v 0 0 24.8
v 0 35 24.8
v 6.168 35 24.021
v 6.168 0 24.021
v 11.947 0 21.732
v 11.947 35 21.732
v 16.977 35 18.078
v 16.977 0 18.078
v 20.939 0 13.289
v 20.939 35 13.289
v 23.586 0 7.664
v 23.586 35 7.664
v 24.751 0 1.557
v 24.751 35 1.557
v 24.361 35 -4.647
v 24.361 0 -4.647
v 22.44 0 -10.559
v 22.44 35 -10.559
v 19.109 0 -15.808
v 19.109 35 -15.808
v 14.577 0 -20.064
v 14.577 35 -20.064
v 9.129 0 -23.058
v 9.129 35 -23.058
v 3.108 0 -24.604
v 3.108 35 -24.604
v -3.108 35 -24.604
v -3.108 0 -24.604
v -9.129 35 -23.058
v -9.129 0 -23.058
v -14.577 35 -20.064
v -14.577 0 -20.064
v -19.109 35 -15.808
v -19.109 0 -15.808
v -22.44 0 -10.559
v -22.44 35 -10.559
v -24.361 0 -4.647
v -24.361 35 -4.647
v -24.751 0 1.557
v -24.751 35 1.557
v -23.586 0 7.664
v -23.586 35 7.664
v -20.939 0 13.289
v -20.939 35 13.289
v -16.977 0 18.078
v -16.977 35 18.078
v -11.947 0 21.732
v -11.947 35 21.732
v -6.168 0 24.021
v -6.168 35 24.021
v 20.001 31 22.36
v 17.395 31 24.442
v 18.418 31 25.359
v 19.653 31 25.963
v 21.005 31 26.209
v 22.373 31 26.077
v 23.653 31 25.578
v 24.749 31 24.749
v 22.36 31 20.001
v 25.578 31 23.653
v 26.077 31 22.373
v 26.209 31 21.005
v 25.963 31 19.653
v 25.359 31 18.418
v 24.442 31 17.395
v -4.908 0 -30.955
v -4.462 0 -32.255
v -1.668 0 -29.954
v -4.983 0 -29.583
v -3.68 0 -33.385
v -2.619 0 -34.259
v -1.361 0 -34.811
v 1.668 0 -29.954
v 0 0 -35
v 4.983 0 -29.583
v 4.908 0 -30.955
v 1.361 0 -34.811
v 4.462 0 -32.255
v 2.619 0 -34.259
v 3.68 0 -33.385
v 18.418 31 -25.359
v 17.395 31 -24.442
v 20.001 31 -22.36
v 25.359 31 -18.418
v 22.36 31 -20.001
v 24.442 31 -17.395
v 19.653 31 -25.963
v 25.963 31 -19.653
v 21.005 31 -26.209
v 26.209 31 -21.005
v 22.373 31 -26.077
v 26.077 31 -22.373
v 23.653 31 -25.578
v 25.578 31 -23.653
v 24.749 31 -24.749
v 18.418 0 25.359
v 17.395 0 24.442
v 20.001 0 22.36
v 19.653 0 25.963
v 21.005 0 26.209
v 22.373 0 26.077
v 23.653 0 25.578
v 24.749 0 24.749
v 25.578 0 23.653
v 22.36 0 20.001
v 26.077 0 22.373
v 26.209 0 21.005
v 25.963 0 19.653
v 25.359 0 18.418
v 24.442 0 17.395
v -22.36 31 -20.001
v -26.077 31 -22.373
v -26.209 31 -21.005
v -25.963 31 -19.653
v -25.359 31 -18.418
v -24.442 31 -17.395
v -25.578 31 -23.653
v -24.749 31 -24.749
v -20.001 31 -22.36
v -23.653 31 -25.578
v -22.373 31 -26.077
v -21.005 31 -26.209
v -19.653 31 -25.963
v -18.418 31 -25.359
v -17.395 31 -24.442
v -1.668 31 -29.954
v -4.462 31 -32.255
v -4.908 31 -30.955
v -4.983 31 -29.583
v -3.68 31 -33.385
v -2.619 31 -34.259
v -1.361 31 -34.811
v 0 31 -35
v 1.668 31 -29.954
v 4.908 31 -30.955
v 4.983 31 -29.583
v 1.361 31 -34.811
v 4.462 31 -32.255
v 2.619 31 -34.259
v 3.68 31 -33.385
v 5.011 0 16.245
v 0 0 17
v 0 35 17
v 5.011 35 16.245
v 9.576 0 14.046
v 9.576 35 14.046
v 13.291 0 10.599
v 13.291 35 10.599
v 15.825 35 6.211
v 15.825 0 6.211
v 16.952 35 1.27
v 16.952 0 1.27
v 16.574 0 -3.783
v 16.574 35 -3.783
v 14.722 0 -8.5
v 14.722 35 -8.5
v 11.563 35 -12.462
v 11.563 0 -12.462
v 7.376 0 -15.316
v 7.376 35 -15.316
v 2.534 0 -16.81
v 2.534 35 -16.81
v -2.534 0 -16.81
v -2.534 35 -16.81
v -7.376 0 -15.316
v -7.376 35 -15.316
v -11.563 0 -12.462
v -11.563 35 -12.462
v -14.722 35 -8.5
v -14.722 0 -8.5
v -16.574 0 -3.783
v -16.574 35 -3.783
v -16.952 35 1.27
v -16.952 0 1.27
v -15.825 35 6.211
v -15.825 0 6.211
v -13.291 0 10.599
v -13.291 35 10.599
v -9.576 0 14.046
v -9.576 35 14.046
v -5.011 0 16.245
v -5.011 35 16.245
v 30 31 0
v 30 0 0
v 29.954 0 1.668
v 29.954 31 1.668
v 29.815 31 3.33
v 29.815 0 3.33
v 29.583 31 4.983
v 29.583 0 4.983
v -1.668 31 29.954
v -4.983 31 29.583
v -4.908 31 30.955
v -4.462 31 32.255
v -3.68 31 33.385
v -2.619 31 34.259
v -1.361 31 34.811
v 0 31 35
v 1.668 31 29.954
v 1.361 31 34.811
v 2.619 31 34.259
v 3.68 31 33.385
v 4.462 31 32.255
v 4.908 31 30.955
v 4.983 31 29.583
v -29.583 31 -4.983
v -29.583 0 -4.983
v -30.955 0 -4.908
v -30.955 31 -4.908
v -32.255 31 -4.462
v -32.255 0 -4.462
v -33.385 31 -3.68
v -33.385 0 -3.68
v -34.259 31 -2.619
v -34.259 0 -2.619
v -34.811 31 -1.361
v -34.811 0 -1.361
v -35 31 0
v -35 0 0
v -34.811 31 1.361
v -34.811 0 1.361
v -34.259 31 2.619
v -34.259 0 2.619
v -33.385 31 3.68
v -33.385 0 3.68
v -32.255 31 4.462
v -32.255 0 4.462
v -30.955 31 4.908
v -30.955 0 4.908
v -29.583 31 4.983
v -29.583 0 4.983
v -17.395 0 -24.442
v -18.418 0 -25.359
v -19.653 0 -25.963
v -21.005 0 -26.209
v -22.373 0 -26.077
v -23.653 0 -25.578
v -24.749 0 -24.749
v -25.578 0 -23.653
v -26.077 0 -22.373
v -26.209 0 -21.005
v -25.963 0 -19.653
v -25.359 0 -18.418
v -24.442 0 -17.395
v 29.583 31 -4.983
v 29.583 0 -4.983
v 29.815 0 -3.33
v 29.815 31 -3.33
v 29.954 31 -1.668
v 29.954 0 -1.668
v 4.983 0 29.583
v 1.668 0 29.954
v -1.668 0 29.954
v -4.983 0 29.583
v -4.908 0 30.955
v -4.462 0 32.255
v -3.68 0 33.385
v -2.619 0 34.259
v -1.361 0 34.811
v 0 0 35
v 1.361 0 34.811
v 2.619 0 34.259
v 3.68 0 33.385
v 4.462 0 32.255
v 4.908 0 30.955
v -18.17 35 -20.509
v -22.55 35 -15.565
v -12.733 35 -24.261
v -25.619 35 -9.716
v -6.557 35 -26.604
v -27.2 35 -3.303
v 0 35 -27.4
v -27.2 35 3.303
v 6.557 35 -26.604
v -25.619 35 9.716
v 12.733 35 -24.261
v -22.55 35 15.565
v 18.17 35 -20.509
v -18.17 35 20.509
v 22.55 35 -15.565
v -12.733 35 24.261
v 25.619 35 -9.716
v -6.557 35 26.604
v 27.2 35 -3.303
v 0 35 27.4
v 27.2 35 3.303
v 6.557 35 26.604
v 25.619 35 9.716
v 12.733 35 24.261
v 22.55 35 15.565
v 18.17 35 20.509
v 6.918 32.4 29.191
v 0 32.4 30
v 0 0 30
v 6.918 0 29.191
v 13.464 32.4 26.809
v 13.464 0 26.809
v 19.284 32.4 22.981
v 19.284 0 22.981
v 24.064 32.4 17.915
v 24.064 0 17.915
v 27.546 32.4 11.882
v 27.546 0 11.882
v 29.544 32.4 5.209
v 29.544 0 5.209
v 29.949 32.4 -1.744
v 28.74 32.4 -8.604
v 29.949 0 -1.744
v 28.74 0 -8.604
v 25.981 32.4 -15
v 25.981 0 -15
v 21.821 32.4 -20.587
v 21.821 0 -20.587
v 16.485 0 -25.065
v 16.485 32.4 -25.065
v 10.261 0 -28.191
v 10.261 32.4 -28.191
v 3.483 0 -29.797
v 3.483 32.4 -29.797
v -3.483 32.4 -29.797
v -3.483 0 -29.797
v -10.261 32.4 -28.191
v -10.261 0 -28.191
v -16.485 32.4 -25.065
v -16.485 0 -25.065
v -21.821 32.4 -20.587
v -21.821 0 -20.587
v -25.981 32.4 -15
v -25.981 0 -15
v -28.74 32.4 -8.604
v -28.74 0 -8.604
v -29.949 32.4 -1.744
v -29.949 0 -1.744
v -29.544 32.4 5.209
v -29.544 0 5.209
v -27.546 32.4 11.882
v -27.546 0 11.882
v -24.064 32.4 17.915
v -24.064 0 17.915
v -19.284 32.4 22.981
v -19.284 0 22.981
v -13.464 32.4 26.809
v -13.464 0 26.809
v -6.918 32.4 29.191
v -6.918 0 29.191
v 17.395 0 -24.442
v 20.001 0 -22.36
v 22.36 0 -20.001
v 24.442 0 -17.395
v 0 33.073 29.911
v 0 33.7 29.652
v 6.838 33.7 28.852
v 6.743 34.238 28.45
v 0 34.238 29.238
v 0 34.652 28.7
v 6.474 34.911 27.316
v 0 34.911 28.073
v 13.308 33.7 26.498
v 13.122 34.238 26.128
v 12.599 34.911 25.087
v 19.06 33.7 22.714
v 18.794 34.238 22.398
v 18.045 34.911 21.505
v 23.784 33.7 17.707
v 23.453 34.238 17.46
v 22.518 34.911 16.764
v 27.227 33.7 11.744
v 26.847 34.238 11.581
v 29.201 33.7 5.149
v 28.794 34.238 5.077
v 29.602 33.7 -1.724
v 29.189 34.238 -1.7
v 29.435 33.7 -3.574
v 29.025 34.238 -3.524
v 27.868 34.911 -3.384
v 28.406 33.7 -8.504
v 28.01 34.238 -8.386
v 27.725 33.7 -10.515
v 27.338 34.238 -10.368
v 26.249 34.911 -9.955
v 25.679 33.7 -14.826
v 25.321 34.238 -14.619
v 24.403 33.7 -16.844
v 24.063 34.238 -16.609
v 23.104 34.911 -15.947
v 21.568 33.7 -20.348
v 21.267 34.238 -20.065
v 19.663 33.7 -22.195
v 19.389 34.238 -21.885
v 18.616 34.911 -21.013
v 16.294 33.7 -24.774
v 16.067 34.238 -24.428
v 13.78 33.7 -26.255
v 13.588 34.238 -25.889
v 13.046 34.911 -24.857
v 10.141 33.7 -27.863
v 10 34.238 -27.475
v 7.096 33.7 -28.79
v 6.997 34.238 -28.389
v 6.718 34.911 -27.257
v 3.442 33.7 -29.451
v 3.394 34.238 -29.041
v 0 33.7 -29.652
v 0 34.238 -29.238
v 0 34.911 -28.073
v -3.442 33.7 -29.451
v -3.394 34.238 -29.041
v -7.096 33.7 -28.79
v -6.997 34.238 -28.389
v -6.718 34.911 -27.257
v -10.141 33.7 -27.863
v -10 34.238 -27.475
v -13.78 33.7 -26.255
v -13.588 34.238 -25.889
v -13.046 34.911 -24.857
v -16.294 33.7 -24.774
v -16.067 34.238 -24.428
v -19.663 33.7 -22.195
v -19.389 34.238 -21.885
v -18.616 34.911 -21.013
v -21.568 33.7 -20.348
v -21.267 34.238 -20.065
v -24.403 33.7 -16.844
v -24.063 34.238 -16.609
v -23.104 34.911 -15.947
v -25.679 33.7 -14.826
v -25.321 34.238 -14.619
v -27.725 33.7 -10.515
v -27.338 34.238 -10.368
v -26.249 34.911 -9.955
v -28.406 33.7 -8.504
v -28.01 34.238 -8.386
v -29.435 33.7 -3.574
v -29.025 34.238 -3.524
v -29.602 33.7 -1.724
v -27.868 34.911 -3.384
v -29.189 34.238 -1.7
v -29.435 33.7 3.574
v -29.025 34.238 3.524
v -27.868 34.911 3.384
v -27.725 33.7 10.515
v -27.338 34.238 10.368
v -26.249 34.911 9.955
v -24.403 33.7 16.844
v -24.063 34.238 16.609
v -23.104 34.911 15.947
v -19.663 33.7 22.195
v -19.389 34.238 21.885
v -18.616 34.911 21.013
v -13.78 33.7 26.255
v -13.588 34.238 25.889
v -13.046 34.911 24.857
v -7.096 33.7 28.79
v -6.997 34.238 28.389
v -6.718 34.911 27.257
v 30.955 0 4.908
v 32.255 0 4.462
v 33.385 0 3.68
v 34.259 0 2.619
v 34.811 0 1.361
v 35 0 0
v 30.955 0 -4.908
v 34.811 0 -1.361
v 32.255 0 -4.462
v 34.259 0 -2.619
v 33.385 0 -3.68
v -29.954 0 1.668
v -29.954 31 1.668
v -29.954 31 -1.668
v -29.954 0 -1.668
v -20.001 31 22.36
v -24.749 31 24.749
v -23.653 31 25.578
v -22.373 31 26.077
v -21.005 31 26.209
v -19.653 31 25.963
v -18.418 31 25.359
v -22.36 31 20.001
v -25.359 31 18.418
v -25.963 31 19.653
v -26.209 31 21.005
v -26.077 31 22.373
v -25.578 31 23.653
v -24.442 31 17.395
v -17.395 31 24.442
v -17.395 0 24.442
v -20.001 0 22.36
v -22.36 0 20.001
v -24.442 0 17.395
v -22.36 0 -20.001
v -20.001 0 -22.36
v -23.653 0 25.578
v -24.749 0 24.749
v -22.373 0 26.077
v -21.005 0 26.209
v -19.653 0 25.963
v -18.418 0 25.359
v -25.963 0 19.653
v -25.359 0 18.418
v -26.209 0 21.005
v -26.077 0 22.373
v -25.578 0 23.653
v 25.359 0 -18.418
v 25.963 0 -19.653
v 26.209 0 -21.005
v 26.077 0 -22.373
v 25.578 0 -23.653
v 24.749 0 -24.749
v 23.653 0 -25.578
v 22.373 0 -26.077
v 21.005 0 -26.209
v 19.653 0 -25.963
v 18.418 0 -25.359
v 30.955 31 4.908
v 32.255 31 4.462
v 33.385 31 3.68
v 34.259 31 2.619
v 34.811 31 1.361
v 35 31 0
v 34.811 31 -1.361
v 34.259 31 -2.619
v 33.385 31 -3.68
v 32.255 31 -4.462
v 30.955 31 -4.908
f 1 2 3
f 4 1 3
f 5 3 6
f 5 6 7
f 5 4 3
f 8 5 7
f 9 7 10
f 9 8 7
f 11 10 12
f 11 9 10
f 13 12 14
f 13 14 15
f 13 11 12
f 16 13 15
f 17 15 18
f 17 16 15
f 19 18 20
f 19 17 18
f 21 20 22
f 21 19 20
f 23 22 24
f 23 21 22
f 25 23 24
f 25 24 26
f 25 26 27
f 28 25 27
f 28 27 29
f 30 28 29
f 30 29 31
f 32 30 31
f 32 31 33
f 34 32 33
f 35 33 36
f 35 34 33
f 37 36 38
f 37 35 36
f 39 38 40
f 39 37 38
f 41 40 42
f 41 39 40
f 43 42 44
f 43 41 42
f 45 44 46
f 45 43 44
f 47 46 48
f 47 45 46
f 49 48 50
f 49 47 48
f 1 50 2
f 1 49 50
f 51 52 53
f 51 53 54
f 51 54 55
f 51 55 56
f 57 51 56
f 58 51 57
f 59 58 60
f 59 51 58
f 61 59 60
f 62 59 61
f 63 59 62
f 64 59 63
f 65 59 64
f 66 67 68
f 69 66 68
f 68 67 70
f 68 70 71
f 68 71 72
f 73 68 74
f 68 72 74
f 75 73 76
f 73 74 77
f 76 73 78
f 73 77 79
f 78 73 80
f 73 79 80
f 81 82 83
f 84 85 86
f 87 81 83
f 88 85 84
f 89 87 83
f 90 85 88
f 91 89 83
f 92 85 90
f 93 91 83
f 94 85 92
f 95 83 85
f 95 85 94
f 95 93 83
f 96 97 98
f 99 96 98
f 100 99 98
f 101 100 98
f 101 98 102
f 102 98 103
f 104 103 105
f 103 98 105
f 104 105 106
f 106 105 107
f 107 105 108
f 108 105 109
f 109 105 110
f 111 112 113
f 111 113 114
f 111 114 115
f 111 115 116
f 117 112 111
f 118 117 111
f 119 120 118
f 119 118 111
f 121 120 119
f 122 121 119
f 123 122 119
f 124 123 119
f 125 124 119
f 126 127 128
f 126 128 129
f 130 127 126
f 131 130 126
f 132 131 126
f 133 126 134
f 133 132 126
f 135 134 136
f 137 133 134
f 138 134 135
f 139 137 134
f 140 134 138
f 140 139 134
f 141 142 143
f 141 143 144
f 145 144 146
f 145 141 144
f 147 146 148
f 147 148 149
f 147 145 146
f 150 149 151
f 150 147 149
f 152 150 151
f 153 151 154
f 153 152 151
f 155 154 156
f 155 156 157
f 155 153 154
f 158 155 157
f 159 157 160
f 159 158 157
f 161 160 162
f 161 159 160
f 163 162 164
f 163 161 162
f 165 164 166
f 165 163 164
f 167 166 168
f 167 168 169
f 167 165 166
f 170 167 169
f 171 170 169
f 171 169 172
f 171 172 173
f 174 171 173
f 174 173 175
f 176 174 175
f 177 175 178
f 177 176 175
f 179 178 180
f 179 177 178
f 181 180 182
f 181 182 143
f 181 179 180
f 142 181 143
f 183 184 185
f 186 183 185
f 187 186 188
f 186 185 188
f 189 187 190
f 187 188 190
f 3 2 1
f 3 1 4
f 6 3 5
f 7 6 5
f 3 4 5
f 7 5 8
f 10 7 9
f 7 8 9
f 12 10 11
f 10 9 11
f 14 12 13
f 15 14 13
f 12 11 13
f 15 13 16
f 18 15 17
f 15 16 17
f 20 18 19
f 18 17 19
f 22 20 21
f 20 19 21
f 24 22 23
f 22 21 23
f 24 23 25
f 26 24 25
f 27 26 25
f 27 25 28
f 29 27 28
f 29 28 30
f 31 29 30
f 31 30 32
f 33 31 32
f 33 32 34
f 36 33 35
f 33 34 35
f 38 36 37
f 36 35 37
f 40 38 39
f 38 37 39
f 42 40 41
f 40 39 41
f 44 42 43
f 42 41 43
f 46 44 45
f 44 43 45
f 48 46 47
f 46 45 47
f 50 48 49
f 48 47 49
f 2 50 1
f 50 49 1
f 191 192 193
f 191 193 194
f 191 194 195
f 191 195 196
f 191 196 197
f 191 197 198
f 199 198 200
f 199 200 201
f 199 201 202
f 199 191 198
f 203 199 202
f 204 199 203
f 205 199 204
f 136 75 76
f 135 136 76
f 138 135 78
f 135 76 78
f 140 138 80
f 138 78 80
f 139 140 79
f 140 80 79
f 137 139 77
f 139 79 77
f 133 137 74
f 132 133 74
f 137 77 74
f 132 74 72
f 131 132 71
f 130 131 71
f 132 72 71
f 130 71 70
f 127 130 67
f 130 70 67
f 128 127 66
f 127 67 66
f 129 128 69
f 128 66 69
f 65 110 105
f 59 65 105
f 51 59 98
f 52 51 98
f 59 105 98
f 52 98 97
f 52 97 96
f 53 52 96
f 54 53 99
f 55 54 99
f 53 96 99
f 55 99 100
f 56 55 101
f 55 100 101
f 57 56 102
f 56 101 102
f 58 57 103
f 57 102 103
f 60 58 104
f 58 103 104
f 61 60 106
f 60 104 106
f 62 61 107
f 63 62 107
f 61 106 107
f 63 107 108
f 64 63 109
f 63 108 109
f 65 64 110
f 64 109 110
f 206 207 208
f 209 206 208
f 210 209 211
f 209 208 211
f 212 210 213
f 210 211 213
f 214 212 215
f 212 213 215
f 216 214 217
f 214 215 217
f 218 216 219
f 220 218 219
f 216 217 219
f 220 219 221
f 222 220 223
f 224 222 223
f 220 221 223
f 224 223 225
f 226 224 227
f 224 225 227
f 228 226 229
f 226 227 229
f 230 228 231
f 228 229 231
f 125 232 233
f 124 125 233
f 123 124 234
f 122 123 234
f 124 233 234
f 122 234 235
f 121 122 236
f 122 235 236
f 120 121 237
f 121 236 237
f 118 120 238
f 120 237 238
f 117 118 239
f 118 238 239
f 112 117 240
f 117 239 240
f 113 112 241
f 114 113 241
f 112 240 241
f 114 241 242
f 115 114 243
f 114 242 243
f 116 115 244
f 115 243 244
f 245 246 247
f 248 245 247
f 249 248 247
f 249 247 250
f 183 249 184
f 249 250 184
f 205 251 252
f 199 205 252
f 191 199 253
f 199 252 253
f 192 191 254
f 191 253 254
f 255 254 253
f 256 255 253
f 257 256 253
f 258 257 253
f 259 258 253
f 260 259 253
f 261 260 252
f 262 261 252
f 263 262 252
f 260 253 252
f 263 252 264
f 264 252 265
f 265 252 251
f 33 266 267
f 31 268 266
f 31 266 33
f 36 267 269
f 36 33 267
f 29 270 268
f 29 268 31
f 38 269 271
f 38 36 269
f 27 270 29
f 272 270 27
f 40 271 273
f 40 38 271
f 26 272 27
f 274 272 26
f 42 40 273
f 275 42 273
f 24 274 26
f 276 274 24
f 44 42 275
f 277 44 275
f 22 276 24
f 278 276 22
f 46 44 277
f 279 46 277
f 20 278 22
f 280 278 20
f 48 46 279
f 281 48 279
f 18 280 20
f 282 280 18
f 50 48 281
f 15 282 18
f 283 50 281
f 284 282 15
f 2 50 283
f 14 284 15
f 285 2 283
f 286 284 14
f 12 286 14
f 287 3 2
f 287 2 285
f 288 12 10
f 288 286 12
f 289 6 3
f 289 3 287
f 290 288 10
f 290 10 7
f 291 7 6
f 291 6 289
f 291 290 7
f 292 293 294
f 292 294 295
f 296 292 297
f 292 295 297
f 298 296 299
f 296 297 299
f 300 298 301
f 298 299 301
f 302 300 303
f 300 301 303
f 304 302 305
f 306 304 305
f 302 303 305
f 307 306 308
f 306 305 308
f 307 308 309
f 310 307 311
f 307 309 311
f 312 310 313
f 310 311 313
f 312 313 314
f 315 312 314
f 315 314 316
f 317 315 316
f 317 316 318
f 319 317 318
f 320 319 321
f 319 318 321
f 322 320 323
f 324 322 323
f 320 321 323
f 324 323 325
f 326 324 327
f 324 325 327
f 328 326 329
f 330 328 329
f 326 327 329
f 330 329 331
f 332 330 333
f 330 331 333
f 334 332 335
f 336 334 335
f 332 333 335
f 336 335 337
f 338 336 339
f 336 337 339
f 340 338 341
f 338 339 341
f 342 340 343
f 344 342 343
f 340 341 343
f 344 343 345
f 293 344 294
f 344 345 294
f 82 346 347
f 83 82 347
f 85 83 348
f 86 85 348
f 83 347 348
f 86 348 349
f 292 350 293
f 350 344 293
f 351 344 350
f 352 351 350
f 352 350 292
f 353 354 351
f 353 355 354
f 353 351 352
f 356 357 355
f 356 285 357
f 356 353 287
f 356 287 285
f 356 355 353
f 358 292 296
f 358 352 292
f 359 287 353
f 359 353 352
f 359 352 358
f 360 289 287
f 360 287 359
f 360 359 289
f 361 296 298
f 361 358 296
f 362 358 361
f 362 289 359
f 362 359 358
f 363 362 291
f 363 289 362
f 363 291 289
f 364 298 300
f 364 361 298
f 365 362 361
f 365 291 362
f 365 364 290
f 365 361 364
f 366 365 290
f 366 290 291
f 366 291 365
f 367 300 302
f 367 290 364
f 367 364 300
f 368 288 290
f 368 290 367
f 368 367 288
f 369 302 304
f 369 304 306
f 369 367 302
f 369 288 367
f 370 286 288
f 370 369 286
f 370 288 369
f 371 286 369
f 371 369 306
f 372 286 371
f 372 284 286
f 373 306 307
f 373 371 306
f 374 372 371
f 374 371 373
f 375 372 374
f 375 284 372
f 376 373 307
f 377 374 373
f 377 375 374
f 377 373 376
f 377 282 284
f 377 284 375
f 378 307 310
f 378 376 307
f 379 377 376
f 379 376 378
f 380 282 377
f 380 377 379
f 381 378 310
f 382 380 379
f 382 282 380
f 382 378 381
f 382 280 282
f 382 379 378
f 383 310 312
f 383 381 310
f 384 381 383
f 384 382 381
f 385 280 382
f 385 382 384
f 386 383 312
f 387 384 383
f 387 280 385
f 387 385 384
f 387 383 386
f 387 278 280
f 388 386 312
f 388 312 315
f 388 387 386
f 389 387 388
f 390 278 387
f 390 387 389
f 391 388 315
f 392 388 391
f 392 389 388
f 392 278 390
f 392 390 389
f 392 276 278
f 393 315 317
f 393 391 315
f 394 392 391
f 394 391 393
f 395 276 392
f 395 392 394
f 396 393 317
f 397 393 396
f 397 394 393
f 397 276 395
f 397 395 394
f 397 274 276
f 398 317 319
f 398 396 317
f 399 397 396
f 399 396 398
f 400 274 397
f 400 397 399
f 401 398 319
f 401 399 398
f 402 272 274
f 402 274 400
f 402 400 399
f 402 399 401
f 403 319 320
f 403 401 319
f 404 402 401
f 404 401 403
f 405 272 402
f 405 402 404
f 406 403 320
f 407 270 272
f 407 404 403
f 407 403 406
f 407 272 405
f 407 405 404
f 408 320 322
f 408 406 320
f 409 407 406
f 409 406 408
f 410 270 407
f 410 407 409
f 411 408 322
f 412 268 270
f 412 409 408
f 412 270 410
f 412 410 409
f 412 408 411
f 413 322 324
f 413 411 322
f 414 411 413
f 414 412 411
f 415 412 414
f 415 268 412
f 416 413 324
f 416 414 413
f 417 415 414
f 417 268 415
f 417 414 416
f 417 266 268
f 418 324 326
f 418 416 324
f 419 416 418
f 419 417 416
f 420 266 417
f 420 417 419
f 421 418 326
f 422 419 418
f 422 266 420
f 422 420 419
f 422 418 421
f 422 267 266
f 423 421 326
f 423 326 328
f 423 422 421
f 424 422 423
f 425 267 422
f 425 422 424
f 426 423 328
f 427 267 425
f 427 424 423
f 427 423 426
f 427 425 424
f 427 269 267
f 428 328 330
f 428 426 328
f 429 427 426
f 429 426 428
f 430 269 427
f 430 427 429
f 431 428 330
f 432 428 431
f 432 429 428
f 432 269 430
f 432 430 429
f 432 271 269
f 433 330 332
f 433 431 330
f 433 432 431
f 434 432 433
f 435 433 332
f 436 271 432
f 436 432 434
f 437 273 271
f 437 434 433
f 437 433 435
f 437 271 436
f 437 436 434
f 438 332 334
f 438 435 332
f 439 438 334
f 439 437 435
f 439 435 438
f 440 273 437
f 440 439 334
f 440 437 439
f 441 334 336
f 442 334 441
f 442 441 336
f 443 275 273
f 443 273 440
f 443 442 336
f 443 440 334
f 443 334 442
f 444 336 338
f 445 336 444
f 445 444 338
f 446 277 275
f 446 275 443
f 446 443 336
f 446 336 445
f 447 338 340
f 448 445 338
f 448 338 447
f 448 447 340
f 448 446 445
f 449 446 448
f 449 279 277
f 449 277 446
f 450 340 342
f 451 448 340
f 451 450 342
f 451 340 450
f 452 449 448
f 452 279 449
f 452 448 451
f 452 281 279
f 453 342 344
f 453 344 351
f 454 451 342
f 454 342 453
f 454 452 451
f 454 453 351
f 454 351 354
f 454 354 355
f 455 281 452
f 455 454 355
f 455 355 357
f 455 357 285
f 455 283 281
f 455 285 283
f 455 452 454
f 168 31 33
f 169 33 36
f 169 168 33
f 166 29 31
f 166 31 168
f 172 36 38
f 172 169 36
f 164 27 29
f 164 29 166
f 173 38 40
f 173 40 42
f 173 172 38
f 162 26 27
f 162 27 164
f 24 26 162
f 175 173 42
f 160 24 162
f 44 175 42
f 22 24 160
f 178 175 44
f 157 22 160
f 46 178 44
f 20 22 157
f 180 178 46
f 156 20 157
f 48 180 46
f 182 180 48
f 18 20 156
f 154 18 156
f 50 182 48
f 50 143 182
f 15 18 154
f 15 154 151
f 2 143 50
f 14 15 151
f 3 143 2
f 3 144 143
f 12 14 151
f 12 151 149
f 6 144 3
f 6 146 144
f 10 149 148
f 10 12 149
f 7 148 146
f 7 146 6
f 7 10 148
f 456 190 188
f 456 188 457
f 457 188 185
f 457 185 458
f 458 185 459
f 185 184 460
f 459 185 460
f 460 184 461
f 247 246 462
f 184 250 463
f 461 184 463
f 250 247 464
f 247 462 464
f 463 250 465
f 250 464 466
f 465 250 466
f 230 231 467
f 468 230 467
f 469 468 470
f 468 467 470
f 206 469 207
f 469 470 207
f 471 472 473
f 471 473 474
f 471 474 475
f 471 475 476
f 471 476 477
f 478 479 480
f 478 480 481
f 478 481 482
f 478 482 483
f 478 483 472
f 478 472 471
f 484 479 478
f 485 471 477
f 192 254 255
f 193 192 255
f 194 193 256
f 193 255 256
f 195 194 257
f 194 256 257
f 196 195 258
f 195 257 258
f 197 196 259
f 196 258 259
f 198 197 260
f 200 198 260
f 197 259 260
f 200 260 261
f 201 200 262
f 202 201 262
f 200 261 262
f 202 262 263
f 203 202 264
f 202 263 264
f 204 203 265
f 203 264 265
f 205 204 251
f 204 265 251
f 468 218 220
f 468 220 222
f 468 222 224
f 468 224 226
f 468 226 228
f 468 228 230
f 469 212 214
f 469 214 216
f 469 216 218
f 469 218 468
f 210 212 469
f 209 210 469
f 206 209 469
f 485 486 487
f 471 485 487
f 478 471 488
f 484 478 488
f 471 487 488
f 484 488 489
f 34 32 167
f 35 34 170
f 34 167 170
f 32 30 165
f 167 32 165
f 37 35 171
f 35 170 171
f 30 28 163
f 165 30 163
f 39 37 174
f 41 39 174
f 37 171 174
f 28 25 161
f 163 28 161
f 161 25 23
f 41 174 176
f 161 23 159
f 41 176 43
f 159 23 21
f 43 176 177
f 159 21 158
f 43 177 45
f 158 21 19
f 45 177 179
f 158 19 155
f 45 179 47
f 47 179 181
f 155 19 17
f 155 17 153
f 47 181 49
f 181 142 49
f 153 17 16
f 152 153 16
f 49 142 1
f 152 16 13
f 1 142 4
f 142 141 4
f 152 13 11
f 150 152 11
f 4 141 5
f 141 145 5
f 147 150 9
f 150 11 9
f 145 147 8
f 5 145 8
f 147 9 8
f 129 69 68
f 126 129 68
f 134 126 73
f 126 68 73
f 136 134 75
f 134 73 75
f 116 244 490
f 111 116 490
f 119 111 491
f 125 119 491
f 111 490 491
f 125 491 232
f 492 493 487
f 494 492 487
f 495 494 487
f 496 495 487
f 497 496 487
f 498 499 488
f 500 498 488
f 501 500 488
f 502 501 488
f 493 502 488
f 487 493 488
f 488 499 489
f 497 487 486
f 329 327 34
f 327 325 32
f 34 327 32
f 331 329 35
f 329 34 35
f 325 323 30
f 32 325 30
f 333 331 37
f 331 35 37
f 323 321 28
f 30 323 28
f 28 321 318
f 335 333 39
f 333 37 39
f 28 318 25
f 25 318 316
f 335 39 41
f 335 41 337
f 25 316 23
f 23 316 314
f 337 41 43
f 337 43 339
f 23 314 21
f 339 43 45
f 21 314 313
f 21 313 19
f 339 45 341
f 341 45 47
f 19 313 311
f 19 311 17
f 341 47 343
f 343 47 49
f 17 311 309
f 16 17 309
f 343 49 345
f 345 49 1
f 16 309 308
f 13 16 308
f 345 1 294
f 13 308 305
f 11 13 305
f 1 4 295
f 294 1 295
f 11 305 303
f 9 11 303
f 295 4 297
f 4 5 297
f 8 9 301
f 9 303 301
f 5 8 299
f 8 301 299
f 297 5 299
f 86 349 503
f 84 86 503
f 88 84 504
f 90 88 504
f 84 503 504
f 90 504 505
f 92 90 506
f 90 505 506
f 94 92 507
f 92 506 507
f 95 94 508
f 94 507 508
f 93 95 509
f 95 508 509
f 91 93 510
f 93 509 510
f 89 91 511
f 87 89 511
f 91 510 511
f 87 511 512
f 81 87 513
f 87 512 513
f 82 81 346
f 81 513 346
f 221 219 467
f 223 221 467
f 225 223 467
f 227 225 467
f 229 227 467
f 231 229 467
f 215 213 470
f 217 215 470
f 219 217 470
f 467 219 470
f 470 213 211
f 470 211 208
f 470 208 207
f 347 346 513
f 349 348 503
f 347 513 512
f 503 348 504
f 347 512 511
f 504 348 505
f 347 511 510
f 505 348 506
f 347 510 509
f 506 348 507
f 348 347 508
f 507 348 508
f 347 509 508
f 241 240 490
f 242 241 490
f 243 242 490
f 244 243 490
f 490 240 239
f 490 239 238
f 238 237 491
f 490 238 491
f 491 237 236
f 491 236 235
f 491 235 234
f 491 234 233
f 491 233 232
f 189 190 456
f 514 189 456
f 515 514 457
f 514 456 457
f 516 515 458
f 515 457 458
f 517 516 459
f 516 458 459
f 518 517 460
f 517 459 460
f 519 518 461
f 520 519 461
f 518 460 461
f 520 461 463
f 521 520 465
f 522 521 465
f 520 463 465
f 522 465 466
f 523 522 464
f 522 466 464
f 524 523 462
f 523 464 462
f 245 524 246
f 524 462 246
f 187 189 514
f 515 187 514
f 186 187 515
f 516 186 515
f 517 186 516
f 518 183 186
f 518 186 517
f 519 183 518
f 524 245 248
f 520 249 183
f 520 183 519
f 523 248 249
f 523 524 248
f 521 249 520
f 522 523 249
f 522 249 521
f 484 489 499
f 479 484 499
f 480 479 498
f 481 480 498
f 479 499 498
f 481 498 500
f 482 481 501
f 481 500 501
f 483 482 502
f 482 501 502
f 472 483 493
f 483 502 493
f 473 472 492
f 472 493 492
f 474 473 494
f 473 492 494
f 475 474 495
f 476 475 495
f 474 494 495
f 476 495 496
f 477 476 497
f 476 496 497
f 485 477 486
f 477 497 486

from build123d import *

# Parameters (mm, degrees)
SKETCH2_R             = 24.8
BOSS_EXTRUDE1_DEPTH   = 35
BOSS_EXTRUDE2_DEPTH   = 31
BOSS_EXTRUDE2_2_DEPTH = 31
BOSS_EXTRUDE2_3_DEPTH = 31
BOSS_EXTRUDE2_4_DEPTH = 31
BOSS_EXTRUDE2_5_DEPTH = 31
BOSS_EXTRUDE2_6_DEPTH = 31
BOSS_EXTRUDE2_7_DEPTH = 31
BOSS_EXTRUDE2_8_DEPTH = 31
SKETCH2_11_R          = 24.8
SKETCH2_11_R_2        = 17
BOSS_EXTRUDE4_DEPTH   = 35
FILLET5_R             = 2.6


with BuildPart() as part:
    # Sketch2 → Boss-Extrude1 (new body)
    with BuildSketch(Plane(origin=(0, 0, 0), x_dir=(1, 0, 0), z_dir=(0, 1, 0))):
        with BuildLine():
            ThreePointArc((29.58333333333338, -4.982608642958634), (29.895651857753503, -2.4999999999998614), (29.999999999999996, -7.35e-15))
            ThreePointArc((29.999999999999996, 0), (29.895651857753478, 2.5000000000001705), (29.58333333333327, 4.982608642959254))
            ThreePointArc((29.58333333333327, 4.982608642959254), (27.71638597533855, 11.480502970952813), (24.441811969537028, 17.39533925066701))
            ThreePointArc((24.441811969537028, 17.39533925066701), (21.213203435596466, 21.21320343559638), (17.395339250667107, 24.44181196953696))
            ThreePointArc((17.395339250667107, 24.44181196953696), (11.480502970952717, 27.71638597533859), (4.982608642958938, 29.583333333333325))
            ThreePointArc((4.982608642958938, 29.583333333333325), (1.84e-15, 29.999999999999996), (-4.98260864295894, 29.583333333333325))
            ThreePointArc((-4.98260864295894, 29.583333333333325), (-11.480502970952713, 27.71638597533859), (-17.395339250667096, 24.441811969536968))
            ThreePointArc((-17.395339250667096, 24.441811969536968), (-21.21320343559646, 21.213203435596387), (-24.441811969537017, 17.395339250667025))
            ThreePointArc((-24.441811969537017, 17.395339250667025), (-27.71638597533862, 11.480502970952633), (-29.583333333333343, 4.982608642958841))
            ThreePointArc((-29.583333333333343, 4.982608642958841), (-29.999999999999996, -1.0291e-13), (-29.583333333333307, -4.982608642959043))
            ThreePointArc((-29.583333333333307, -4.982608642959043), (-27.716385975338632, -11.480502970952614), (-24.441811969537152, -17.395339250666837))
            ThreePointArc((-24.441811969537152, -17.395339250666837), (-21.213203435596615, -21.21320343559623), (-17.395339250667277, -24.441811969536836))
            ThreePointArc((-17.395339250667277, -24.441811969536836), (-11.480502970953104, -27.71638597533843), (-4.9826086429595255, -29.58333333333323))
            ThreePointArc((-4.9826086429595255, -29.58333333333323), (-2.1867e-13, -29.999999999999996), (4.9826086429591205, -29.583333333333293))
            ThreePointArc((4.9826086429591205, -29.583333333333293), (11.4805029709527, -27.716385975338596), (17.395339250666918, -24.44181196953709))
            ThreePointArc((17.395339250666918, -24.44181196953709), (21.213203435596306, -21.21320343559654), (24.441811969536896, -17.395339250667192))
            ThreePointArc((24.441811969536896, -17.395339250667192), (27.716385975338632, -11.480502970952612), (29.58333333333338, -4.982608642958634))
        make_face()
        Circle(SKETCH2_R, mode=Mode.SUBTRACT)
    extrude(amount=BOSS_EXTRUDE1_DEPTH)

    # Fillet5
    fillet5_edges = [part.edges().sort_by_distance(p)[0] for p in [
        (-29.58333333333346, 35, -4.982608642958666),
    ]]
    fillet(fillet5_edges, radius=FILLET5_R)


with BuildPart() as body_2:
    # Sketch2<8> → Boss-Extrude2 (new body)
    with BuildSketch(Plane(origin=(0, 0, 0), x_dir=(1, 0, 0), z_dir=(0, 1, 0))):
        with BuildLine():
            ThreePointArc((29.583333333333275, 4.982608642959254), (30, 3.1974e-13), (29.583333333333382, -4.982608642958624))
            ThreePointArc((29.58333333333338, -4.982608642958625), (34.999999999997485, 3.6798e-13), (29.583333333333282, 4.982608642959255))
        make_face()
    extrude(amount=BOSS_EXTRUDE2_DEPTH)


with BuildPart() as body_3:
    # Sketch2<8> → Boss-Extrude2 2 (new body)
    with BuildSketch(Plane(origin=(0, 0, 0), x_dir=(1, 0, 0), z_dir=(0, 1, 0))):
        with BuildLine():
            ThreePointArc((17.395339250667107, 24.44181196953696), (21.213203435596466, 21.21320343559638), (24.441811969537028, 17.39533925066701))
            ThreePointArc((24.44181196953703, 17.39533925066701), (24.74873734152867, 24.74873734152857), (17.39533925066711, 24.441811969536964))
        make_face()
    extrude(amount=BOSS_EXTRUDE2_2_DEPTH)


with BuildPart() as body_4:
    # Sketch2<8> → Boss-Extrude2 3 (new body)
    with BuildSketch(Plane(origin=(0, 0, 0), x_dir=(1, 0, 0), z_dir=(0, 1, 0))):
        with BuildLine():
            ThreePointArc((17.395339250666932, -24.441811969537085), (24.748737341529054, -24.748737341529317), (24.441811969536907, -17.39533925066719))
            ThreePointArc((24.441811969536896, -17.395339250667192), (21.213203435596306, -21.21320343559654), (17.395339250666918, -24.44181196953709))
        make_face()
    extrude(amount=BOSS_EXTRUDE2_3_DEPTH)


with BuildPart() as body_5:
    # Sketch2<8> → Boss-Extrude2 4 (new body)
    with BuildSketch(Plane(origin=(0, 0, 0), x_dir=(1, 0, 0), z_dir=(0, 1, 0))):
        with BuildLine():
            ThreePointArc((-4.98260864295894, 29.583333333333325), (1.84e-15, 29.999999999999996), (4.982608642958938, 29.583333333333325))
            ThreePointArc((4.98260864295894, 29.58333333333333), (9.4e-16, 35.000000000000014), (-4.982608642958942, 29.583333333333332))
        make_face()
    extrude(amount=BOSS_EXTRUDE2_4_DEPTH)


with BuildPart() as body_6:
    # Sketch2<8> → Boss-Extrude2 5 (new body)
    with BuildSketch(Plane(origin=(0, 0, 0), x_dir=(1, 0, 0), z_dir=(0, 1, 0))):
        with BuildLine():
            ThreePointArc((-4.982608642959509, -29.583333333333233), (-2.281e-13, -35.000000000009365), (4.982608642959123, -29.583333333333297))
            ThreePointArc((4.9826086429591205, -29.583333333333293), (-2.1867e-13, -29.999999999999996), (-4.9826086429595255, -29.58333333333323))
        make_face()
    extrude(amount=BOSS_EXTRUDE2_5_DEPTH)


with BuildPart() as body_7:
    # Sketch2<8> → Boss-Extrude2 6 (new body)
    with BuildSketch(Plane(origin=(0, 0, 0), x_dir=(1, 0, 0), z_dir=(0, 1, 0))):
        with BuildLine():
            ThreePointArc((-24.441811969537017, 17.395339250667025), (-21.21320343559646, 21.213203435596387), (-17.395339250667096, 24.441811969536968))
            ThreePointArc((-17.3953392506671, 24.441811969536964), (-24.74873734152922, 24.74873734152914), (-24.441811969537024, 17.39533925066702))
        make_face()
    extrude(amount=BOSS_EXTRUDE2_6_DEPTH)


with BuildPart() as body_8:
    # Sketch2<8> → Boss-Extrude2 7 (new body)
    with BuildSketch(Plane(origin=(0, 0, 0), x_dir=(1, 0, 0), z_dir=(0, 1, 0))):
        with BuildLine():
            ThreePointArc((-24.44181196953715, -17.395339250666844), (-24.748737341529395, -24.748737341528958), (-17.395339250667277, -24.441811969536843))
            ThreePointArc((-17.395339250667277, -24.441811969536836), (-21.213203435596615, -21.21320343559623), (-24.441811969537152, -17.395339250666837))
        make_face()
    extrude(amount=BOSS_EXTRUDE2_7_DEPTH)


with BuildPart() as body_9:
    # Sketch2<8> → Boss-Extrude2 8 (new body)
    with BuildSketch(Plane(origin=(0, 0, 0), x_dir=(1, 0, 0), z_dir=(0, 1, 0))):
        with BuildLine():
            ThreePointArc((-29.583333333333307, -4.982608642959043), (-29.999999999999996, -1.0291e-13), (-29.583333333333343, 4.982608642958841))
            ThreePointArc((-29.58333333333334, 4.982608642958835), (-35.00000000000002, -1.199e-13), (-29.58333333333331, -4.982608642959043))
        make_face()
    extrude(amount=BOSS_EXTRUDE2_8_DEPTH)


with BuildPart() as body_10:
    # Sketch2<11> → Boss-Extrude4 (new body)
    with BuildSketch(Plane(origin=(0, 0, 0), x_dir=(1, 0, 0), z_dir=(0, 1, 0))):
        Circle(SKETCH2_11_R)
        Circle(SKETCH2_11_R_2, mode=Mode.SUBTRACT)
    extrude(amount=BOSS_EXTRUDE4_DEPTH)


solid = Compound([part.part, body_2.part, body_3.part, body_4.part, body_5.part, body_6.part, body_7.part, body_8.part, body_9.part, body_10.part])
